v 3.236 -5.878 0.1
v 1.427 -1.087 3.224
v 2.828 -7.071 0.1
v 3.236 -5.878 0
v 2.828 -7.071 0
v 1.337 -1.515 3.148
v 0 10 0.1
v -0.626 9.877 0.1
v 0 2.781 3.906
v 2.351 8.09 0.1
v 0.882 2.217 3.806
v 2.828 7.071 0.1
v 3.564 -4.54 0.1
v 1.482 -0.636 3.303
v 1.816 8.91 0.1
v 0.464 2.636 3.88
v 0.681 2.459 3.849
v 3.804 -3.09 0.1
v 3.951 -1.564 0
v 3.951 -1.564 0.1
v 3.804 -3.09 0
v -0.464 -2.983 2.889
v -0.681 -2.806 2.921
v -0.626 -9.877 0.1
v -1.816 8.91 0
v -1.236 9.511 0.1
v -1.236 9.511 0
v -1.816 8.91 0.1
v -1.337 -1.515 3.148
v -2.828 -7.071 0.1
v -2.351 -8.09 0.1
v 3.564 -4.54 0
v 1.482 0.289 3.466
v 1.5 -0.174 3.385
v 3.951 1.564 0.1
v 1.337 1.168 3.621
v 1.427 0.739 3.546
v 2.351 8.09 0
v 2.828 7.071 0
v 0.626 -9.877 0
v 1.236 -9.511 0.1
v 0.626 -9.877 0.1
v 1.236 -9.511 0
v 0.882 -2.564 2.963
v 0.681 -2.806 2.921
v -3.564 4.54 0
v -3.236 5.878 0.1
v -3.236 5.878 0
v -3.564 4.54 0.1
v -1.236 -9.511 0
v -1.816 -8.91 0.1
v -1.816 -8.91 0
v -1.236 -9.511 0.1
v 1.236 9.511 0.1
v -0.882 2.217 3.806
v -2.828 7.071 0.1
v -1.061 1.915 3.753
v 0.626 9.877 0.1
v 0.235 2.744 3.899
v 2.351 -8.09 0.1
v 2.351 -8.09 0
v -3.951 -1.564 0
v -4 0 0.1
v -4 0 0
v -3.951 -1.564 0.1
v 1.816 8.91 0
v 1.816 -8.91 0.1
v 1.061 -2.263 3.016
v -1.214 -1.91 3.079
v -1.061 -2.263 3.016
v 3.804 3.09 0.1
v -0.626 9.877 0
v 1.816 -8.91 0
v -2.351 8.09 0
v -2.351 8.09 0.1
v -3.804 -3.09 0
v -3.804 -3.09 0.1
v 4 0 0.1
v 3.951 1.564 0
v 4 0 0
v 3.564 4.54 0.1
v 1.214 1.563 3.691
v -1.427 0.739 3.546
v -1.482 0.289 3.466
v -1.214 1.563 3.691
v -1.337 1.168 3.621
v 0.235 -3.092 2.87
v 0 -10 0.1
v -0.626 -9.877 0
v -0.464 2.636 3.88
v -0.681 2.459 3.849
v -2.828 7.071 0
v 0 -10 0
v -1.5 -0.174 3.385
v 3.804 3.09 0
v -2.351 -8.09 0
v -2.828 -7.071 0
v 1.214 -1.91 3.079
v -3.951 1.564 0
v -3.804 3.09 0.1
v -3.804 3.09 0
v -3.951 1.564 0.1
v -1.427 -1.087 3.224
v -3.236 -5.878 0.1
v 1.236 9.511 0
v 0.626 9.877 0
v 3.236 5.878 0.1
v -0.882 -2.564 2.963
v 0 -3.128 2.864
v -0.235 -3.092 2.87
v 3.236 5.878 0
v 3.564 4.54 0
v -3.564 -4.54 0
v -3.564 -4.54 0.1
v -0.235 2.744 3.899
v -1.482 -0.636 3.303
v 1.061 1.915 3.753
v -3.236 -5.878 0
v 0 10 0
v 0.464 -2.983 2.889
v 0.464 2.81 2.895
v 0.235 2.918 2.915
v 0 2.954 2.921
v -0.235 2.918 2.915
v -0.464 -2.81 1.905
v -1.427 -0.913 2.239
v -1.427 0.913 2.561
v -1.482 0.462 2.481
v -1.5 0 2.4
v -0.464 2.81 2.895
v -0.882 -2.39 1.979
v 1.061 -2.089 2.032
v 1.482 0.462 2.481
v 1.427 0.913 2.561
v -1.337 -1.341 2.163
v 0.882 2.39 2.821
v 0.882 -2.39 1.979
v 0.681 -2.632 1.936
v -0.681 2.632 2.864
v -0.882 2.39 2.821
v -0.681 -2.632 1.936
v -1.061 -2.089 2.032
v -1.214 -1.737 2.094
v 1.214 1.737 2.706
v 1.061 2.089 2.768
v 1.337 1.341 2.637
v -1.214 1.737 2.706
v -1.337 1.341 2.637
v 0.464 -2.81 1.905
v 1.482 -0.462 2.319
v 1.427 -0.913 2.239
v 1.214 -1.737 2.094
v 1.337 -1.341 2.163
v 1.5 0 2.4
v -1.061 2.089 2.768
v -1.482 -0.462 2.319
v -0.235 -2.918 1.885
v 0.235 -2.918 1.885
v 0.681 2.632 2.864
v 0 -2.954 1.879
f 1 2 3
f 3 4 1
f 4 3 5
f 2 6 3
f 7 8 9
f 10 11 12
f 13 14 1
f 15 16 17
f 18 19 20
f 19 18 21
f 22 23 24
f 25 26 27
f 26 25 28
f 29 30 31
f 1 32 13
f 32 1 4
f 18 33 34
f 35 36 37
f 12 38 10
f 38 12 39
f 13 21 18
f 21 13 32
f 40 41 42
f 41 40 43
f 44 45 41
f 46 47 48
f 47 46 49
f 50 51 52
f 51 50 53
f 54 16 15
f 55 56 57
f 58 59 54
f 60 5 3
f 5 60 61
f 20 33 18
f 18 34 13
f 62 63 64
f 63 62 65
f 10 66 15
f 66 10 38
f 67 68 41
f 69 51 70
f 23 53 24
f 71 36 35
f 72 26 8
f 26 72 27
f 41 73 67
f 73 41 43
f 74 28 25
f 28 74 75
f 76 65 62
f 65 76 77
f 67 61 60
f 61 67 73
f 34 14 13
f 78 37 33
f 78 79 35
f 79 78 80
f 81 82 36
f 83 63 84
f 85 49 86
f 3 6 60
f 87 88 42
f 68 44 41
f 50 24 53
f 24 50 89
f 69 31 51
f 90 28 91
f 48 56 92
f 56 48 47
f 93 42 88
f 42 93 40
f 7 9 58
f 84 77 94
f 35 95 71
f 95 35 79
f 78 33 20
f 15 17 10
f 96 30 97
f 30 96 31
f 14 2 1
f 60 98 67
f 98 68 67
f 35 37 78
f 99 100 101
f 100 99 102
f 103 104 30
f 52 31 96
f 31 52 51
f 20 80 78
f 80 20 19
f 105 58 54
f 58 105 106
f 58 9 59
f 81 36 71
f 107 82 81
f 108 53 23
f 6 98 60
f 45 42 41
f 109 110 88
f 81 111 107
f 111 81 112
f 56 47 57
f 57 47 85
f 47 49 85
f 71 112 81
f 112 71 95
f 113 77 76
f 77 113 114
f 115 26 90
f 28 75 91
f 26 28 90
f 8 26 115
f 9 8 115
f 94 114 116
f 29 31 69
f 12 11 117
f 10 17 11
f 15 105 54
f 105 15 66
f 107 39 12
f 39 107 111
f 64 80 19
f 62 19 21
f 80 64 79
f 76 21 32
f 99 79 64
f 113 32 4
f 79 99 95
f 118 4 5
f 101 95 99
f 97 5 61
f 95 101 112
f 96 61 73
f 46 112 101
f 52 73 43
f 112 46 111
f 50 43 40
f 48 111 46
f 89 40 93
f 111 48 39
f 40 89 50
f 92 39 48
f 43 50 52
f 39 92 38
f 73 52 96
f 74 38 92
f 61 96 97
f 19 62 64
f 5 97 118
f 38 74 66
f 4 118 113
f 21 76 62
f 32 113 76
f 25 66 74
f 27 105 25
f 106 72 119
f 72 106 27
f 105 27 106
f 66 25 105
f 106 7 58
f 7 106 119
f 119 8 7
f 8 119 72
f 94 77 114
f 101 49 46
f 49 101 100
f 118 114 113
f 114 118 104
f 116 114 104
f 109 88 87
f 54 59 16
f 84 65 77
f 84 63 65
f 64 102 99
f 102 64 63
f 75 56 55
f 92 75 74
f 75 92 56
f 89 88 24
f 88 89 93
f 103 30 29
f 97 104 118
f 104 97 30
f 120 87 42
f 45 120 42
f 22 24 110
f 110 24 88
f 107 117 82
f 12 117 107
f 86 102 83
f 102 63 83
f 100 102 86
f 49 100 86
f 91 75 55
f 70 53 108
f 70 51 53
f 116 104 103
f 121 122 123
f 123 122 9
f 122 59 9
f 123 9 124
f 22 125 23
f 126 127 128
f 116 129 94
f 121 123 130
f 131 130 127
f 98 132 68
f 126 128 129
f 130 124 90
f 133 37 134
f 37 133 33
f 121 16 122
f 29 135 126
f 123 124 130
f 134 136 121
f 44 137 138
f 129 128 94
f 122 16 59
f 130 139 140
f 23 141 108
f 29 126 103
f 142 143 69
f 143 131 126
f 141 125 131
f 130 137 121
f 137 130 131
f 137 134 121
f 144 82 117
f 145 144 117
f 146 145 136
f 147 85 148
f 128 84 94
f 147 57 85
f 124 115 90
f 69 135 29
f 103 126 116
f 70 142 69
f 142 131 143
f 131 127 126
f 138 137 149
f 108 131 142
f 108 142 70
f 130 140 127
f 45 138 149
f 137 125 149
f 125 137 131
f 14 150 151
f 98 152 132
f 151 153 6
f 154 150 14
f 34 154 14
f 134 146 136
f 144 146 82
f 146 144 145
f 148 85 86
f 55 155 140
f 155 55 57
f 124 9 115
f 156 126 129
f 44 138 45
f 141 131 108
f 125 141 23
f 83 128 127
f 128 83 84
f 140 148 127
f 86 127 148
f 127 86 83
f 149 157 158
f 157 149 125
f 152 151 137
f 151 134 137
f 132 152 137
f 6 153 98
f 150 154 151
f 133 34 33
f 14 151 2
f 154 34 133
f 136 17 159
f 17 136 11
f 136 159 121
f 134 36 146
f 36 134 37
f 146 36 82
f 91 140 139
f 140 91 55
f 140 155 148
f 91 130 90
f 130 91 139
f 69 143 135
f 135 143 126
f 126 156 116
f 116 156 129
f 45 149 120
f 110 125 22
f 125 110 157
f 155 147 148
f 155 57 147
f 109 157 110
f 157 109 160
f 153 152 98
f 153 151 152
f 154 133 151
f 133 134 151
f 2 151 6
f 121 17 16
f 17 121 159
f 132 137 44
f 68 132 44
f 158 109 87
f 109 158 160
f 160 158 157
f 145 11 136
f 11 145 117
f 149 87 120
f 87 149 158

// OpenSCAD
$fn = 40;

module oval_stand(oval_w, oval_l, oval_base_depth, inaccuracy)
{
  // calc
  oval_w_ina = oval_w + inaccuracy;
  oval_l_ina = oval_l + inaccuracy;

  base_w_ina = oval_w*2;
  base_l_ina = oval_l*2;
  height = oval_w_ina*0.8;
  
  module ovalshape(w,l,h)
  {
    linear_extrude(h)
      resize(newsize=[w,l,1]) 
        circle(r=1);
  }
  
  difference()
  {
    hull()
    {
      ovalshape(base_w_ina*2, base_l_ina*2, 0.1);
      
      translate([0,0,height])
        rotate([10,0,0])
          ovalshape(oval_w_ina, oval_l_ina, 1);
    }
    
    #translate([0,0,height])
      rotate([10,0,0])
        ovalshape(oval_w_ina, oval_l_ina, oval_base_depth);
  }
}


oval_stand(2,5,1,1);
